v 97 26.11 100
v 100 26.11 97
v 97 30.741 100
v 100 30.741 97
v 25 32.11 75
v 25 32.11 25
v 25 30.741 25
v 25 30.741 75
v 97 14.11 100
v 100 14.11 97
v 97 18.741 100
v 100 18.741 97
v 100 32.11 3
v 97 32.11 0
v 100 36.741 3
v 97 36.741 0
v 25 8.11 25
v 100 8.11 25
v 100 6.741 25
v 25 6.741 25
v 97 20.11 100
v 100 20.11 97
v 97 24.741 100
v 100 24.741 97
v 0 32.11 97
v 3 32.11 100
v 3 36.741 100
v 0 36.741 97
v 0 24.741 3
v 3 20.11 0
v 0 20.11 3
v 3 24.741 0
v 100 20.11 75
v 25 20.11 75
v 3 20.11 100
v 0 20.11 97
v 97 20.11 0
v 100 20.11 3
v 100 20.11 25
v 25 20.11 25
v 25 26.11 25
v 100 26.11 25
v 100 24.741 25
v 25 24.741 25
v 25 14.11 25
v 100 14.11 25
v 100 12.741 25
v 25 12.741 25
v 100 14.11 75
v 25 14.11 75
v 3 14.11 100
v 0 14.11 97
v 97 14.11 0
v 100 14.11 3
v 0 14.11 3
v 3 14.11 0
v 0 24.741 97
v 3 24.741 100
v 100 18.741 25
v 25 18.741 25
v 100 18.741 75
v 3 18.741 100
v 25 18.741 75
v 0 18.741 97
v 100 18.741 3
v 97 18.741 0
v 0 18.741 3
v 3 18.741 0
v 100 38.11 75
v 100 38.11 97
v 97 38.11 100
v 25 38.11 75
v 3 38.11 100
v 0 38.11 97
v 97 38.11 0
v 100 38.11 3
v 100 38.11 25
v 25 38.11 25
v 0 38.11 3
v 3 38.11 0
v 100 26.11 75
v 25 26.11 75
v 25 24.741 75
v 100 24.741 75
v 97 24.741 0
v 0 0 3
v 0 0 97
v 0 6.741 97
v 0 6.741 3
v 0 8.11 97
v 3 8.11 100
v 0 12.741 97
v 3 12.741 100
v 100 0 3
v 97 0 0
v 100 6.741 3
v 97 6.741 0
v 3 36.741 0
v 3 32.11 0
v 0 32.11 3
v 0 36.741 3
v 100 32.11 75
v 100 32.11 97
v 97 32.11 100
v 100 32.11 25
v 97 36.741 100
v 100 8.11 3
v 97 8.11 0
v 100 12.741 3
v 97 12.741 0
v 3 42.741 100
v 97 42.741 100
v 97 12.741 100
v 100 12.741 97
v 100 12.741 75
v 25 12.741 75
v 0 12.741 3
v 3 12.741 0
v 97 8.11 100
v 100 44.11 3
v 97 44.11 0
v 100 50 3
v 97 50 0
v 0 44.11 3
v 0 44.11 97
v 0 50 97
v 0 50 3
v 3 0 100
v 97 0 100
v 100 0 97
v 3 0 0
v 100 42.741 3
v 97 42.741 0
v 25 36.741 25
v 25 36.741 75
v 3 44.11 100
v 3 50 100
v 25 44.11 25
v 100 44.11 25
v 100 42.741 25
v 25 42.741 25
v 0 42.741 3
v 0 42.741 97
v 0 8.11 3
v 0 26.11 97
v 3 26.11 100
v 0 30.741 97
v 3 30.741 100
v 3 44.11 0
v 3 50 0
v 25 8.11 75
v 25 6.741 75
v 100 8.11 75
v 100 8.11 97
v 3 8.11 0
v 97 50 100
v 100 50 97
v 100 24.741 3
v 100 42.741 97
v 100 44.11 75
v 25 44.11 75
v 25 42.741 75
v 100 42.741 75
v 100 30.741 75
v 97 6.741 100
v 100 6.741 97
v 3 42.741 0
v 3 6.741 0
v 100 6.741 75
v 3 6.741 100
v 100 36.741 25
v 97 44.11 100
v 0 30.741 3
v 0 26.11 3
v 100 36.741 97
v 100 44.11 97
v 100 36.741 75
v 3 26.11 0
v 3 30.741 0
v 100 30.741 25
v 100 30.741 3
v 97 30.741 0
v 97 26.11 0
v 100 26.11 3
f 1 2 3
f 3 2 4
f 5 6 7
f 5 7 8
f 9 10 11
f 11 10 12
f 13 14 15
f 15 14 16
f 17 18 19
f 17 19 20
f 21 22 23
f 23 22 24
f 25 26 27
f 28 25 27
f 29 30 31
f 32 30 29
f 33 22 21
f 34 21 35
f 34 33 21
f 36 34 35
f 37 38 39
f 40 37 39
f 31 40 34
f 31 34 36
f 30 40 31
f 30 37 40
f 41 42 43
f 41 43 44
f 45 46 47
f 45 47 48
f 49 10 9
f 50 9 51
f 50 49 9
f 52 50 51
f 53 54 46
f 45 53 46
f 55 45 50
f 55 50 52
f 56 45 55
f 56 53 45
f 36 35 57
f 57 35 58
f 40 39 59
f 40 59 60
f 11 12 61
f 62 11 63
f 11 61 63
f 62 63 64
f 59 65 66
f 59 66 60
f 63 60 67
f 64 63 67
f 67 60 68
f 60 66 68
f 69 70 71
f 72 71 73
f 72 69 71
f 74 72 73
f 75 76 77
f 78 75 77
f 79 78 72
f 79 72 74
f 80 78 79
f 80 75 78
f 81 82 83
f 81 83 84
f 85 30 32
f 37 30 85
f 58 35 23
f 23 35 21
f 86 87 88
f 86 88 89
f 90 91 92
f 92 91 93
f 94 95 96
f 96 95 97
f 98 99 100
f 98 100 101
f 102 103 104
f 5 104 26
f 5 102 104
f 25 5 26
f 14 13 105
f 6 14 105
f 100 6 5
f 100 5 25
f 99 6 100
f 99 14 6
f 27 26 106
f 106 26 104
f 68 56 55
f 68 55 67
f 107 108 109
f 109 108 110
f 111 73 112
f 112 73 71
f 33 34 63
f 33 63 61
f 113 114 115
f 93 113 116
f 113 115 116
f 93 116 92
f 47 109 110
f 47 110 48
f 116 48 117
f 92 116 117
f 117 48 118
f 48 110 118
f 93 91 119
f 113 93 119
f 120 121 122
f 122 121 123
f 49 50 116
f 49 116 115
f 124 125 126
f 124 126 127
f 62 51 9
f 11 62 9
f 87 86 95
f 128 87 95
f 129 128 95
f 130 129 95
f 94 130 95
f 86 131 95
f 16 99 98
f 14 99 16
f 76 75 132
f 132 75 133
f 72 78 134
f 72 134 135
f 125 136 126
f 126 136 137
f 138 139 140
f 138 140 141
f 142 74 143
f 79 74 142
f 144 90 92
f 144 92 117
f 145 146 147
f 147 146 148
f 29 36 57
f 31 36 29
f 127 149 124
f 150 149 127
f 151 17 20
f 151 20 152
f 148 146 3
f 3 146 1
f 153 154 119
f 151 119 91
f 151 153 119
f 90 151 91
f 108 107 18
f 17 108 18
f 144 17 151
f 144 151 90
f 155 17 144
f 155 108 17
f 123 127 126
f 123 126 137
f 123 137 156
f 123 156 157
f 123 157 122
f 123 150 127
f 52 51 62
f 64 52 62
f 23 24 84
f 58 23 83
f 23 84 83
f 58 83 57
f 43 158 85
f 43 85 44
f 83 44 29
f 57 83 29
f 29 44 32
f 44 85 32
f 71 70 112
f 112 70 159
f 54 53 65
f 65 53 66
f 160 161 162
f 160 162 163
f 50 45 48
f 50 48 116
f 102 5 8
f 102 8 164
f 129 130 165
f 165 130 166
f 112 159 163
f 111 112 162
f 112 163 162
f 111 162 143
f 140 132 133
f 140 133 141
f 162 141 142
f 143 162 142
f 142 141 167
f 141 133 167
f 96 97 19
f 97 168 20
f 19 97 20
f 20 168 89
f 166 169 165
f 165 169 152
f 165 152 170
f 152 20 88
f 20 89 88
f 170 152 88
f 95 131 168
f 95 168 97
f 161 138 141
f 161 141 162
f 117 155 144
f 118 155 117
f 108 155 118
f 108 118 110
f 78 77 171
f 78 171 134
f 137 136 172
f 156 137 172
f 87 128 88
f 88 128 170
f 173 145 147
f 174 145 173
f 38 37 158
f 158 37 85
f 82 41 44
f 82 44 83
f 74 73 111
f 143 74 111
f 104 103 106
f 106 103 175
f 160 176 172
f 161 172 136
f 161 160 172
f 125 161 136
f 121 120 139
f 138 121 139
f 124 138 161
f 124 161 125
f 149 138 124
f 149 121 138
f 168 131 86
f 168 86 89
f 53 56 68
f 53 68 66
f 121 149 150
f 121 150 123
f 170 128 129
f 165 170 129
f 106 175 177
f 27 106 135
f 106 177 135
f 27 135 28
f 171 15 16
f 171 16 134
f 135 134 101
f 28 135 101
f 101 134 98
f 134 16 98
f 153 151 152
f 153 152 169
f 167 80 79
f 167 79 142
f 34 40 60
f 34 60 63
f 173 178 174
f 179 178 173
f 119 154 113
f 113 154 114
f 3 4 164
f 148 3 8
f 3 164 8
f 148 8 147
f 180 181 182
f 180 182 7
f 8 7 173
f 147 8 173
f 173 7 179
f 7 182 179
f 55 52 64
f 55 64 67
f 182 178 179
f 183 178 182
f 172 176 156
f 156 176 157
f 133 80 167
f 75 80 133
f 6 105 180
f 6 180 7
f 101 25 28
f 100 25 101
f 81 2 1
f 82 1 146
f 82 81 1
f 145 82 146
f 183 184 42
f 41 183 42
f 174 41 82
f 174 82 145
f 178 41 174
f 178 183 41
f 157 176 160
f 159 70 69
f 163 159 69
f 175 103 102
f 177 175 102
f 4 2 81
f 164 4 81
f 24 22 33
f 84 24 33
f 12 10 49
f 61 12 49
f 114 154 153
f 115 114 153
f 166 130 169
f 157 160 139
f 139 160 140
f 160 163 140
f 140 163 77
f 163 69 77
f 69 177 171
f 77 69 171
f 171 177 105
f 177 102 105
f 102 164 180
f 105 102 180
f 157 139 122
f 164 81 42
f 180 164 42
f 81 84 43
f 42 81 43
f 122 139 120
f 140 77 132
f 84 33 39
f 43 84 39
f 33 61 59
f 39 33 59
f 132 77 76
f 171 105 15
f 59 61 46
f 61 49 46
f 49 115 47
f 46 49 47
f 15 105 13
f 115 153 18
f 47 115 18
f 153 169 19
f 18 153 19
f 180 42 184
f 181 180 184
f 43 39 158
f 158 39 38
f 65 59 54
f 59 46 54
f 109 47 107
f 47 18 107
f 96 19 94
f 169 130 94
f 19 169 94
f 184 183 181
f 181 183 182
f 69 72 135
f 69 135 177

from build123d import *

# Parameters (mm, degrees)
SKETCH1_W           = 100
SKETCH1_H           = 100
BOSS_EXTRUDE1_DEPTH = 50
CHAMFER1_SIZE       = 3
SKETCH3_W           = 100
SKETCH3_H           = 1.369103339
CUT_EXTRUDE1_DEPTH  = 25
SKETCH4_W           = 72
SKETCH4_H           = 1.369103339
SKETCH4_W_2         = 3
SKETCH4_W_3         = 75
CUT_EXTRUDE2_DEPTH  = 25
SKETCH5_W           = 75
SKETCH5_H           = 1.369103339
CUT_EXTRUDE3_DEPTH  = 25


with BuildPart() as part:
    # Sketch1 → Boss-Extrude1 (new body)
    with BuildSketch(Plane(origin=(0, 0, 0), x_dir=(1, 0, 0), z_dir=(0, 1, 0))):
        with Locations((50, -50)):
            Rectangle(SKETCH1_W, SKETCH1_H)
    extrude(amount=BOSS_EXTRUDE1_DEPTH)

    # Chamfer1
    chamfer1_edges = [part.edges().sort_by_distance(p)[0] for p in [
        (0, 25, 0),
        (100, 25, 0),
        (100, 25, 100),
        (0, 25, 100),
    ]]
    chamfer(chamfer1_edges, length=CHAMFER1_SIZE)

    # Sketch3 → Cut-Extrude1 (cut)
    with BuildSketch(Plane.ZY):
        with Locations((50, 43.425849107)):
            Rectangle(SKETCH3_W, SKETCH3_H)
        with Locations((50, 37.425849107)):
            Rectangle(SKETCH3_W, SKETCH3_H)
        with Locations((50, 31.425849107)):
            Rectangle(SKETCH3_W, SKETCH3_H)
        with Locations((50, 25.425849107)):
            Rectangle(SKETCH3_W, SKETCH3_H)
        with Locations((50, 19.425849107)):
            Rectangle(SKETCH3_W, SKETCH3_H)
        with Locations((50, 13.425849107)):
            Rectangle(SKETCH3_W, SKETCH3_H)
        with Locations((50, 7.425849108)):
            Rectangle(SKETCH3_W, SKETCH3_H)
    extrude(amount=-CUT_EXTRUDE1_DEPTH, mode=Mode.SUBTRACT)

    # Sketch4 → Cut-Extrude2 (cut)
    with BuildSketch(Plane.XY.offset(100)):
        with Locations((61, 25.425849107)):
            Rectangle(SKETCH4_W, SKETCH4_H)
        with Locations((61, 19.425849107)):
            Rectangle(SKETCH4_W, SKETCH4_H)
        with Locations((61, 13.425849107)):
            Rectangle(SKETCH4_W, SKETCH4_H)
        with Locations((98.5, 25.425849107)):
            Rectangle(SKETCH4_W_2, SKETCH4_H)
        with Locations((98.5, 19.425849107)):
            Rectangle(SKETCH4_W_2, SKETCH4_H)
        with Locations((98.5, 13.425849107)):
            Rectangle(SKETCH4_W_2, SKETCH4_H)
        with Locations((62.5, 7.425849108)):
            Rectangle(SKETCH4_W_3, SKETCH4_H)
        with Locations((62.5, 31.425849107)):
            Rectangle(SKETCH4_W_3, SKETCH4_H)
        with Locations((62.5, 37.425849107)):
            Rectangle(SKETCH4_W_3, SKETCH4_H)
        with Locations((62.5, 43.425849107)):
            Rectangle(SKETCH4_W_3, SKETCH4_H)
    extrude(amount=-CUT_EXTRUDE2_DEPTH, mode=Mode.SUBTRACT)

    # Sketch5 → Cut-Extrude3 (cut)
    with BuildSketch(Plane(origin=(0, 0, 0), x_dir=(-1, 0, 0), z_dir=(0, 0, -1))):
        with Locations((-62.5, 43.425849107)):
            Rectangle(SKETCH5_W, SKETCH5_H)
        with Locations((-62.5, 37.425849107)):
            Rectangle(SKETCH5_W, SKETCH5_H)
        with Locations((-62.5, 31.425849107)):
            Rectangle(SKETCH5_W, SKETCH5_H)
        with Locations((-62.5, 25.425849107)):
            Rectangle(SKETCH5_W, SKETCH5_H)
        with Locations((-62.5, 19.425849107)):
            Rectangle(SKETCH5_W, SKETCH5_H)
        with Locations((-62.5, 13.425849107)):
            Rectangle(SKETCH5_W, SKETCH5_H)
        with Locations((-62.5, 7.425849108)):
            Rectangle(SKETCH5_W, SKETCH5_H)
    extrude(amount=-CUT_EXTRUDE3_DEPTH, mode=Mode.SUBTRACT)


solid = part.part
